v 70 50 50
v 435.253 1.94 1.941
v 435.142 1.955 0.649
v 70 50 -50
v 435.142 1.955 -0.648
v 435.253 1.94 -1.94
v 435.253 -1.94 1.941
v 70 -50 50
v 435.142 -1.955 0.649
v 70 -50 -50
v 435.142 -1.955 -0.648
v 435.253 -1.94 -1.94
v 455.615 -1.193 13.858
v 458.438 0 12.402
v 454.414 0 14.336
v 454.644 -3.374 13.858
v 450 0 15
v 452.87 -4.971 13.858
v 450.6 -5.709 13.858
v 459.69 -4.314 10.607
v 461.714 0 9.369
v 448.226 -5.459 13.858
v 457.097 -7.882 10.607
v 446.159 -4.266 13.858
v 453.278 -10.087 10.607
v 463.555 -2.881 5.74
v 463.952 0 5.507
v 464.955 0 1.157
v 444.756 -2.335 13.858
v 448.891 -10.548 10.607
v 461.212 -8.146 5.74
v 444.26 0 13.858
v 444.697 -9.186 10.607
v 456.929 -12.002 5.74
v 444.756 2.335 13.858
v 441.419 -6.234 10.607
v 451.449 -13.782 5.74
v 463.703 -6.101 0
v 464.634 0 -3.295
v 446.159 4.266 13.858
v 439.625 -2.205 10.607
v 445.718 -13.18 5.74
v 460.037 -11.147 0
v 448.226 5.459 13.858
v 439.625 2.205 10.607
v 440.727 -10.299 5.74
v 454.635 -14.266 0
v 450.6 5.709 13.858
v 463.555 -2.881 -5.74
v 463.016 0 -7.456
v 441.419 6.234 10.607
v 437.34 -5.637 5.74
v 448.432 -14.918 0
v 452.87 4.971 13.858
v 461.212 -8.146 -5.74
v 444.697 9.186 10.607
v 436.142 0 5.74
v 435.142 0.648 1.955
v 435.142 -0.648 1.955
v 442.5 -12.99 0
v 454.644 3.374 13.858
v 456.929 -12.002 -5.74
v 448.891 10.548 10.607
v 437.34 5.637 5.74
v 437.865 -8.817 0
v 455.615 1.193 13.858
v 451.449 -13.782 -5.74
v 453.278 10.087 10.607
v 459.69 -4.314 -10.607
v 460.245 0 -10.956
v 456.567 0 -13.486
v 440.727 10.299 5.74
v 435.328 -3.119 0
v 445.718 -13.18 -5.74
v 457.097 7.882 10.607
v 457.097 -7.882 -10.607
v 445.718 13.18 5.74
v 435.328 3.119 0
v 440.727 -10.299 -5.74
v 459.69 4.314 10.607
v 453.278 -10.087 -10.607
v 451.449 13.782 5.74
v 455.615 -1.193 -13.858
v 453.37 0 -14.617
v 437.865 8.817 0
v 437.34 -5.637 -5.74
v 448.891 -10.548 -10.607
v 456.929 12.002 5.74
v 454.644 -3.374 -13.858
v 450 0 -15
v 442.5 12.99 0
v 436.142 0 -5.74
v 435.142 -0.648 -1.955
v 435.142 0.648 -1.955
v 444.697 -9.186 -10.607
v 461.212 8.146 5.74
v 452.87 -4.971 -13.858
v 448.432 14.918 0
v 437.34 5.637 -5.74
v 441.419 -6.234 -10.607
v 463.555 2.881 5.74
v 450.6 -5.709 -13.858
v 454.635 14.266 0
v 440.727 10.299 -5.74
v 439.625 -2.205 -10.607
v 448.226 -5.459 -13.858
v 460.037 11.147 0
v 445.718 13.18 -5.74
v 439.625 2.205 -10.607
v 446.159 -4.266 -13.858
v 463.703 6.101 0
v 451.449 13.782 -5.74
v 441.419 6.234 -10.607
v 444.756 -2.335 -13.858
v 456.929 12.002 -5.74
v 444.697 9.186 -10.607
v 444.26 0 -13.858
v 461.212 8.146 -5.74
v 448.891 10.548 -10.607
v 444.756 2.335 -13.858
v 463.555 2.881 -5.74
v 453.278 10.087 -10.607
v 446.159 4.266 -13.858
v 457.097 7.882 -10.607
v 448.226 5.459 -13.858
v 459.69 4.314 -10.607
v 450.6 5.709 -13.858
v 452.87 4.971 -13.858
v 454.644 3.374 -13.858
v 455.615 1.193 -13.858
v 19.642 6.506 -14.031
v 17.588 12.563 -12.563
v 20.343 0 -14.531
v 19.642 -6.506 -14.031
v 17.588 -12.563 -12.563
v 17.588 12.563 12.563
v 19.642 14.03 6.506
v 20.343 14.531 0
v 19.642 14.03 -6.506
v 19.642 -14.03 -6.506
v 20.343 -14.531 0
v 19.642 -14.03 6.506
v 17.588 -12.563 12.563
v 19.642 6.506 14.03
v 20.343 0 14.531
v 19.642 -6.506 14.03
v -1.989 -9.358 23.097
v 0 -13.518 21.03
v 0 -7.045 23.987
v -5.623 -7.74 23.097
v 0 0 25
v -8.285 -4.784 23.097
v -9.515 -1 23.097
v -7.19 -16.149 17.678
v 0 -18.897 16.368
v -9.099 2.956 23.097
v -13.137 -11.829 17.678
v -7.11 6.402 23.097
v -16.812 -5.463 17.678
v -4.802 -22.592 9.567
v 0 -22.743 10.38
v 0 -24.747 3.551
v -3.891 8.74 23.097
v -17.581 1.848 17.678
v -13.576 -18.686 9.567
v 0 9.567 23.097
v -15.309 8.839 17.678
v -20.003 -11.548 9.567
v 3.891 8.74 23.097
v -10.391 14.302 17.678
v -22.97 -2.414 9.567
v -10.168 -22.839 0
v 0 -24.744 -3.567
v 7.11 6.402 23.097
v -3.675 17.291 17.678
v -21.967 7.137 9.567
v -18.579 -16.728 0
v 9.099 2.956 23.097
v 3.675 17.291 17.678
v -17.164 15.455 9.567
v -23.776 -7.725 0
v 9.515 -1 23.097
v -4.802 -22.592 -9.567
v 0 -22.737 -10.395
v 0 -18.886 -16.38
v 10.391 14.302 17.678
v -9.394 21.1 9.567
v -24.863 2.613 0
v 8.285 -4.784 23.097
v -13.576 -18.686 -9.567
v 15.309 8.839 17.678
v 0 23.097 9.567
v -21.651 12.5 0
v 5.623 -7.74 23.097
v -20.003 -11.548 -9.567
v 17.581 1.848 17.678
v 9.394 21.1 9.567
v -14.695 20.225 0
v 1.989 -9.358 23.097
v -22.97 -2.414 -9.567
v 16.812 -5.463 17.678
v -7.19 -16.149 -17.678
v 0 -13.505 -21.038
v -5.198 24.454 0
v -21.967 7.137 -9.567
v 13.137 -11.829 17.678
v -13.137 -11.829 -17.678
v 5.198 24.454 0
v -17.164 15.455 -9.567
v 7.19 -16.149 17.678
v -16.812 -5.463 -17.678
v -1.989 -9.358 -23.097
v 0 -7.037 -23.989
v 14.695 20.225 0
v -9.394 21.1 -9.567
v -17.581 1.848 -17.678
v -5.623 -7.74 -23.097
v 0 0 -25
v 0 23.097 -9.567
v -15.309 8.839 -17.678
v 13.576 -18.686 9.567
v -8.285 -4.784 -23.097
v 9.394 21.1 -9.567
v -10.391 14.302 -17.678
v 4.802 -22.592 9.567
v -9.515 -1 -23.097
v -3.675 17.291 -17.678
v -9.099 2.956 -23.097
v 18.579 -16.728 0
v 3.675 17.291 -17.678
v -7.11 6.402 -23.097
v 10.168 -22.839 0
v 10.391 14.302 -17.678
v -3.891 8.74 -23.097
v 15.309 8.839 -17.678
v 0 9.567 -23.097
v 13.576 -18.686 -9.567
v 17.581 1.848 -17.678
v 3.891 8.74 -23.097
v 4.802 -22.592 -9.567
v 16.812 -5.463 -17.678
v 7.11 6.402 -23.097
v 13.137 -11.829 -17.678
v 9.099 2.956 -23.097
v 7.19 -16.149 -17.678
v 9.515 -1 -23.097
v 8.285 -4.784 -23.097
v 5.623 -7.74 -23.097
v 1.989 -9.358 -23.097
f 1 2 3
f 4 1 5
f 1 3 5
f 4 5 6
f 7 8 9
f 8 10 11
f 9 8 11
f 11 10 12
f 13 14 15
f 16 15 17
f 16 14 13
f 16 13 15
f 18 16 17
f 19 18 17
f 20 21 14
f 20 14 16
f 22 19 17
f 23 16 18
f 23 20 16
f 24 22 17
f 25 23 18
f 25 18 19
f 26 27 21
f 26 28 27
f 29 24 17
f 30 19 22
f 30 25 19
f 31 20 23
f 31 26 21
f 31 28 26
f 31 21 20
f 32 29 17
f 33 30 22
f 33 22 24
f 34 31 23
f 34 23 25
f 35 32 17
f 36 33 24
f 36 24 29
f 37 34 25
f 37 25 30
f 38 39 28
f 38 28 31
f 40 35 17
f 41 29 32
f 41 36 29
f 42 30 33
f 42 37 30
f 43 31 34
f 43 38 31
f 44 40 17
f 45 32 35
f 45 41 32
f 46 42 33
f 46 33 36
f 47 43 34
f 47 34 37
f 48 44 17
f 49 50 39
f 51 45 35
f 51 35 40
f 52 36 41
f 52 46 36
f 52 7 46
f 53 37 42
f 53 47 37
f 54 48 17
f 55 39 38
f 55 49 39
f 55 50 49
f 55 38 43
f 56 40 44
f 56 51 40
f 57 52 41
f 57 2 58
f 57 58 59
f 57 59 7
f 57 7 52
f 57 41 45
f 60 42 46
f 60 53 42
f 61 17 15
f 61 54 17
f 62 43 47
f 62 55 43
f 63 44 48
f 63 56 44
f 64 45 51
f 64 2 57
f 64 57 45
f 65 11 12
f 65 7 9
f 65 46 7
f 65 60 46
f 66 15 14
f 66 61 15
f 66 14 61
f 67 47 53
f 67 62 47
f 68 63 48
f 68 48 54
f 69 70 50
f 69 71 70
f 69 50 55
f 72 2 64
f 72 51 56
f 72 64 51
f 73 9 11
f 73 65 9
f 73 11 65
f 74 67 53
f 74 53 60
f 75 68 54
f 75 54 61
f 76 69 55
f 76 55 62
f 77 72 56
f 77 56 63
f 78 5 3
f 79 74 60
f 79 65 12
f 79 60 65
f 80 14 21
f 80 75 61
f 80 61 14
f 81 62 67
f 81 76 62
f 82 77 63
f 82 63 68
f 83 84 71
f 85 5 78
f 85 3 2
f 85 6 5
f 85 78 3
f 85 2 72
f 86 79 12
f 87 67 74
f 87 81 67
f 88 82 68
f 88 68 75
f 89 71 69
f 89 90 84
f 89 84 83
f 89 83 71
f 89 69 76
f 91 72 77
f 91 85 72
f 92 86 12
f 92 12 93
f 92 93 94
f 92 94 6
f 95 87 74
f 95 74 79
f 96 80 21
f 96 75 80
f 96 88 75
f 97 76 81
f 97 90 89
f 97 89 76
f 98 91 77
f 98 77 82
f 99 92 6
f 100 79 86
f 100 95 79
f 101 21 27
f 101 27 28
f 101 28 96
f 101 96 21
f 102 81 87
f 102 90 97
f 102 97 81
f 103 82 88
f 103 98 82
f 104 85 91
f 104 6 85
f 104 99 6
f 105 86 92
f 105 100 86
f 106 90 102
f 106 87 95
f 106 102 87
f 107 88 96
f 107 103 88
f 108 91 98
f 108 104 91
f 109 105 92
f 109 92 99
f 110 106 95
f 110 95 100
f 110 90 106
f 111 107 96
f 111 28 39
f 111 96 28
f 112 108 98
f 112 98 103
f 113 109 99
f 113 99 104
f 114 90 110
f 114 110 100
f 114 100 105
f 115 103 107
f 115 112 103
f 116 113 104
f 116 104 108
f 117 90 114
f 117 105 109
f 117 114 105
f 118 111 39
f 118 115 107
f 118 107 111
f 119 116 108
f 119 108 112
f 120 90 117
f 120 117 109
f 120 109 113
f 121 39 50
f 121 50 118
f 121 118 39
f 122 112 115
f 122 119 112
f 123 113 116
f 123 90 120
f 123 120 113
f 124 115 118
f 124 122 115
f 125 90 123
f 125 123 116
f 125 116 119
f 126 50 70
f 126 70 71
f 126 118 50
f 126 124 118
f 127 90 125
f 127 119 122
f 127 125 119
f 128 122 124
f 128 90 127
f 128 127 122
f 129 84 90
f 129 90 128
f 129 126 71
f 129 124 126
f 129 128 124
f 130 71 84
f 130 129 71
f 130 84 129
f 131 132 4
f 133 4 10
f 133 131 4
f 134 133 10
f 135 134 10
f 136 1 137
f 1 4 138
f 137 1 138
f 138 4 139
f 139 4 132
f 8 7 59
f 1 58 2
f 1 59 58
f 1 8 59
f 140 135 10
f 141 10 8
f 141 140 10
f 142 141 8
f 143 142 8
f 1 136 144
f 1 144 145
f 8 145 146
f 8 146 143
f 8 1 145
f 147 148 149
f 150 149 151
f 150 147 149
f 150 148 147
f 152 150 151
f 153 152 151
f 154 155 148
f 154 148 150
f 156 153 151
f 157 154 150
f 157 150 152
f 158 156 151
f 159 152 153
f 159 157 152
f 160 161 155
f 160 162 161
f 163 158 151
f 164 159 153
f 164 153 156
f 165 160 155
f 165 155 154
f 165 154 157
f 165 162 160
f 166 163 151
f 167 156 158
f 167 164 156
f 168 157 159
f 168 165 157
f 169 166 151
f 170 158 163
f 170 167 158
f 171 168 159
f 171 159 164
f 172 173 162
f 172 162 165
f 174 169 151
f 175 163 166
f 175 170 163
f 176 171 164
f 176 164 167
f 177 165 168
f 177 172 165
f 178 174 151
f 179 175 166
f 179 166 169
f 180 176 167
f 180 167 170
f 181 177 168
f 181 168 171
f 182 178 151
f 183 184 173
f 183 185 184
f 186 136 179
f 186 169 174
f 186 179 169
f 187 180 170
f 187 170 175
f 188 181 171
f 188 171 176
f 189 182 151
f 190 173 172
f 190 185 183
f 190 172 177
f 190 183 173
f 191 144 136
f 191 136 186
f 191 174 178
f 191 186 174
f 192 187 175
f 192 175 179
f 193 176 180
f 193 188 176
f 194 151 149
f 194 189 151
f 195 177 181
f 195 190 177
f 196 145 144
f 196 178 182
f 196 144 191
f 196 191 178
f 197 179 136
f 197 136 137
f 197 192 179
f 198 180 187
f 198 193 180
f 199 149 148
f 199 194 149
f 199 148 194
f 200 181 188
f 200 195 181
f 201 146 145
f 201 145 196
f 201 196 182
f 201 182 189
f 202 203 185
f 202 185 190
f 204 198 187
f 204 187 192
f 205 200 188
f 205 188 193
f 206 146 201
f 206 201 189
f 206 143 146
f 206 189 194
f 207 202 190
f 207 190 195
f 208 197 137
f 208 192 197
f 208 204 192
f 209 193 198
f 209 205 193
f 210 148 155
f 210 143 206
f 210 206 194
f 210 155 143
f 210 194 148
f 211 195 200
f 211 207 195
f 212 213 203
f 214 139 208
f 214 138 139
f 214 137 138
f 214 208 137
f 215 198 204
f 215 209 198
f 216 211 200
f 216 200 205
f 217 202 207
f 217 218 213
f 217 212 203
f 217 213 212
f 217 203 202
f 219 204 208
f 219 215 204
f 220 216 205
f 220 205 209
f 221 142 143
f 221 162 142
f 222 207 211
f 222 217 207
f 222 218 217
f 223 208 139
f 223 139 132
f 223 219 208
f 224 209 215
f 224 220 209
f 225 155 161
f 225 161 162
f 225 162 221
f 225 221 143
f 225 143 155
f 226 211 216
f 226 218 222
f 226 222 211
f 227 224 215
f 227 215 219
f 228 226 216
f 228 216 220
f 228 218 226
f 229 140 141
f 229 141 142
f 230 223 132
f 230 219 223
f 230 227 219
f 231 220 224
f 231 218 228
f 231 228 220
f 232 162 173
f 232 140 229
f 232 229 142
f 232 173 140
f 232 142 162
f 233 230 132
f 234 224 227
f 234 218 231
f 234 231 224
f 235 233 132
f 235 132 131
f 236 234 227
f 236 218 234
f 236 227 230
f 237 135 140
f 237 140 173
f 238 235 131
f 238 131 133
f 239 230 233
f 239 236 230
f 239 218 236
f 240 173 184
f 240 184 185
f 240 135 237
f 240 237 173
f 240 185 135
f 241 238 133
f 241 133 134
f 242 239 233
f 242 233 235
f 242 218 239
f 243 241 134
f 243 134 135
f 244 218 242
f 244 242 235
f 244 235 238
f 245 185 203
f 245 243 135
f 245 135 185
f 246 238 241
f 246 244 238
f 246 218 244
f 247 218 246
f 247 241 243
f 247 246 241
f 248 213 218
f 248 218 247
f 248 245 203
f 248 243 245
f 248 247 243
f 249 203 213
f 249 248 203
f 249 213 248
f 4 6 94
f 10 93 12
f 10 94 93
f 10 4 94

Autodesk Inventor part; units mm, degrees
ref_plane "YZ Plane" through (0, 0, 0) normal (1, 0, 0) x (0, 1, 0)
ref_plane "XZ Plane" through (0, 0, 0) normal (0, 1, 0) x (-1, 0, 0)
ref_plane "XY Plane" through (0, 0, 0) normal (0, 0, 1) x (1, 0, 0)
sketch "草圖3" plane through (0, 0, 0) normal (0, 1, 0) x (-1, 0, 0)
  line L0 (0, 50) -> (-450, 50)
  line L1 (-450, 50) -> (-450, -50)
  line L2 (-450, -50) -> (0, -50)
  line L3 (0, -50) -> (0, 50)
  point P0 (0, 0)
  point P1 (0, 0)
  dimension "d17" = 100
  dimension "d18" = 450
extrude "擠出3" add sketch "草圖3" along normal mid plane 100
chamfer "倒角4" distance 50 distance2 70 1 edges at (0, 0, 50) measured on face at (0, -16.6667, -16.6667)
chamfer "倒角5" distance 70 distance2 50 1 edges at (0, -50, -25) measured on face at (173.3333, -50, -16.6667)
chamfer "倒角6" distance 70 distance2 50 1 edges at (0, 25, -50) measured on face at (173.3333, 16.6667, -50)
chamfer "倒角8" distance 50 distance2 380 1 edges at (450, 0, -50) measured on face at (450, 16.6667, -16.6667)
chamfer "倒角9" distance 380 distance2 50 1 edges at (450, 50, 25) measured on face at (196.6667, 50, 0)
chamfer "倒角10" distance 50 distance2 380 1 edges at (450, -25, 50) measured on face at (450, -33.3333, 33.3333)
sketch "草圖4" plane through (0, 0, 0) normal (0, 0, 1) x (1, 0, 0)
  line L0 (450, -50) -> (70, -50) projected
  line L1 (450, 0) -> (70, 50) projected
  line L2 (70, -50) -> (450, 0)
  line L3 (450, 0) -> (450, -50) projected
  line L4 (450, 0) -> (450, -50)
  line L5 (450, -50) -> (70, -50)
  point P0 (0, 0)
  point P1 (70, 50)
  point P2 (170, -50)
  point P3 (170, 50)
extrude "擠出4" cut sketch "草圖4" along normal mid plane 100
sketch "草圖5" plane through (0, 0, 0) normal (0, 0, 1) x (1, 0, 0)
  line L0 (70, -50) -> (0, 0) projected
  line L1 (0, 50) -> (0, 0) projected
  line L2 (0, 0) -> (0, 50)
  line L3 (70, 50) -> (70, -50) projected
  line L4 (0, 50) -> (70, 50)
  line L5 (70, 50) -> (0, 0)
extrude "擠出5" cut sketch "草圖5" along normal mid plane 100 contours L1 L4 L5
sketch "草圖6" plane through (0, 0, 0) normal (1, 0, 0) x (0, 1, 0)
  circle A0 centre (0, 0) radius 25
  line L0 (0, 25) -> (0, -25)
  point P0 (0, 0)
  dimension "d46" = 50
revolve "迴轉1" add sketch "草圖6" angle 360 about axis through (0, 0, 25) along (0, 0, -1) picked at (-8.8525, -4.4917) contours L0 A0
sketch "草圖7" plane through (0, 0, 0) normal (0, 1, 0) x (-1, 0, 0)
  line L0 (-450, 0) -> (-70, -50) projected
  circle A0 centre (-450, 0) radius 15
  line L1 (-450, 15) -> (-450, -15)
  point P0 (0, 0)
  dimension "d48" = 30
revolve "迴轉2" add sketch "草圖7" angle 360 about axis through (450, 0, 15) along (0, 0, -1) contours L1 A0
properties part number "Bone"
